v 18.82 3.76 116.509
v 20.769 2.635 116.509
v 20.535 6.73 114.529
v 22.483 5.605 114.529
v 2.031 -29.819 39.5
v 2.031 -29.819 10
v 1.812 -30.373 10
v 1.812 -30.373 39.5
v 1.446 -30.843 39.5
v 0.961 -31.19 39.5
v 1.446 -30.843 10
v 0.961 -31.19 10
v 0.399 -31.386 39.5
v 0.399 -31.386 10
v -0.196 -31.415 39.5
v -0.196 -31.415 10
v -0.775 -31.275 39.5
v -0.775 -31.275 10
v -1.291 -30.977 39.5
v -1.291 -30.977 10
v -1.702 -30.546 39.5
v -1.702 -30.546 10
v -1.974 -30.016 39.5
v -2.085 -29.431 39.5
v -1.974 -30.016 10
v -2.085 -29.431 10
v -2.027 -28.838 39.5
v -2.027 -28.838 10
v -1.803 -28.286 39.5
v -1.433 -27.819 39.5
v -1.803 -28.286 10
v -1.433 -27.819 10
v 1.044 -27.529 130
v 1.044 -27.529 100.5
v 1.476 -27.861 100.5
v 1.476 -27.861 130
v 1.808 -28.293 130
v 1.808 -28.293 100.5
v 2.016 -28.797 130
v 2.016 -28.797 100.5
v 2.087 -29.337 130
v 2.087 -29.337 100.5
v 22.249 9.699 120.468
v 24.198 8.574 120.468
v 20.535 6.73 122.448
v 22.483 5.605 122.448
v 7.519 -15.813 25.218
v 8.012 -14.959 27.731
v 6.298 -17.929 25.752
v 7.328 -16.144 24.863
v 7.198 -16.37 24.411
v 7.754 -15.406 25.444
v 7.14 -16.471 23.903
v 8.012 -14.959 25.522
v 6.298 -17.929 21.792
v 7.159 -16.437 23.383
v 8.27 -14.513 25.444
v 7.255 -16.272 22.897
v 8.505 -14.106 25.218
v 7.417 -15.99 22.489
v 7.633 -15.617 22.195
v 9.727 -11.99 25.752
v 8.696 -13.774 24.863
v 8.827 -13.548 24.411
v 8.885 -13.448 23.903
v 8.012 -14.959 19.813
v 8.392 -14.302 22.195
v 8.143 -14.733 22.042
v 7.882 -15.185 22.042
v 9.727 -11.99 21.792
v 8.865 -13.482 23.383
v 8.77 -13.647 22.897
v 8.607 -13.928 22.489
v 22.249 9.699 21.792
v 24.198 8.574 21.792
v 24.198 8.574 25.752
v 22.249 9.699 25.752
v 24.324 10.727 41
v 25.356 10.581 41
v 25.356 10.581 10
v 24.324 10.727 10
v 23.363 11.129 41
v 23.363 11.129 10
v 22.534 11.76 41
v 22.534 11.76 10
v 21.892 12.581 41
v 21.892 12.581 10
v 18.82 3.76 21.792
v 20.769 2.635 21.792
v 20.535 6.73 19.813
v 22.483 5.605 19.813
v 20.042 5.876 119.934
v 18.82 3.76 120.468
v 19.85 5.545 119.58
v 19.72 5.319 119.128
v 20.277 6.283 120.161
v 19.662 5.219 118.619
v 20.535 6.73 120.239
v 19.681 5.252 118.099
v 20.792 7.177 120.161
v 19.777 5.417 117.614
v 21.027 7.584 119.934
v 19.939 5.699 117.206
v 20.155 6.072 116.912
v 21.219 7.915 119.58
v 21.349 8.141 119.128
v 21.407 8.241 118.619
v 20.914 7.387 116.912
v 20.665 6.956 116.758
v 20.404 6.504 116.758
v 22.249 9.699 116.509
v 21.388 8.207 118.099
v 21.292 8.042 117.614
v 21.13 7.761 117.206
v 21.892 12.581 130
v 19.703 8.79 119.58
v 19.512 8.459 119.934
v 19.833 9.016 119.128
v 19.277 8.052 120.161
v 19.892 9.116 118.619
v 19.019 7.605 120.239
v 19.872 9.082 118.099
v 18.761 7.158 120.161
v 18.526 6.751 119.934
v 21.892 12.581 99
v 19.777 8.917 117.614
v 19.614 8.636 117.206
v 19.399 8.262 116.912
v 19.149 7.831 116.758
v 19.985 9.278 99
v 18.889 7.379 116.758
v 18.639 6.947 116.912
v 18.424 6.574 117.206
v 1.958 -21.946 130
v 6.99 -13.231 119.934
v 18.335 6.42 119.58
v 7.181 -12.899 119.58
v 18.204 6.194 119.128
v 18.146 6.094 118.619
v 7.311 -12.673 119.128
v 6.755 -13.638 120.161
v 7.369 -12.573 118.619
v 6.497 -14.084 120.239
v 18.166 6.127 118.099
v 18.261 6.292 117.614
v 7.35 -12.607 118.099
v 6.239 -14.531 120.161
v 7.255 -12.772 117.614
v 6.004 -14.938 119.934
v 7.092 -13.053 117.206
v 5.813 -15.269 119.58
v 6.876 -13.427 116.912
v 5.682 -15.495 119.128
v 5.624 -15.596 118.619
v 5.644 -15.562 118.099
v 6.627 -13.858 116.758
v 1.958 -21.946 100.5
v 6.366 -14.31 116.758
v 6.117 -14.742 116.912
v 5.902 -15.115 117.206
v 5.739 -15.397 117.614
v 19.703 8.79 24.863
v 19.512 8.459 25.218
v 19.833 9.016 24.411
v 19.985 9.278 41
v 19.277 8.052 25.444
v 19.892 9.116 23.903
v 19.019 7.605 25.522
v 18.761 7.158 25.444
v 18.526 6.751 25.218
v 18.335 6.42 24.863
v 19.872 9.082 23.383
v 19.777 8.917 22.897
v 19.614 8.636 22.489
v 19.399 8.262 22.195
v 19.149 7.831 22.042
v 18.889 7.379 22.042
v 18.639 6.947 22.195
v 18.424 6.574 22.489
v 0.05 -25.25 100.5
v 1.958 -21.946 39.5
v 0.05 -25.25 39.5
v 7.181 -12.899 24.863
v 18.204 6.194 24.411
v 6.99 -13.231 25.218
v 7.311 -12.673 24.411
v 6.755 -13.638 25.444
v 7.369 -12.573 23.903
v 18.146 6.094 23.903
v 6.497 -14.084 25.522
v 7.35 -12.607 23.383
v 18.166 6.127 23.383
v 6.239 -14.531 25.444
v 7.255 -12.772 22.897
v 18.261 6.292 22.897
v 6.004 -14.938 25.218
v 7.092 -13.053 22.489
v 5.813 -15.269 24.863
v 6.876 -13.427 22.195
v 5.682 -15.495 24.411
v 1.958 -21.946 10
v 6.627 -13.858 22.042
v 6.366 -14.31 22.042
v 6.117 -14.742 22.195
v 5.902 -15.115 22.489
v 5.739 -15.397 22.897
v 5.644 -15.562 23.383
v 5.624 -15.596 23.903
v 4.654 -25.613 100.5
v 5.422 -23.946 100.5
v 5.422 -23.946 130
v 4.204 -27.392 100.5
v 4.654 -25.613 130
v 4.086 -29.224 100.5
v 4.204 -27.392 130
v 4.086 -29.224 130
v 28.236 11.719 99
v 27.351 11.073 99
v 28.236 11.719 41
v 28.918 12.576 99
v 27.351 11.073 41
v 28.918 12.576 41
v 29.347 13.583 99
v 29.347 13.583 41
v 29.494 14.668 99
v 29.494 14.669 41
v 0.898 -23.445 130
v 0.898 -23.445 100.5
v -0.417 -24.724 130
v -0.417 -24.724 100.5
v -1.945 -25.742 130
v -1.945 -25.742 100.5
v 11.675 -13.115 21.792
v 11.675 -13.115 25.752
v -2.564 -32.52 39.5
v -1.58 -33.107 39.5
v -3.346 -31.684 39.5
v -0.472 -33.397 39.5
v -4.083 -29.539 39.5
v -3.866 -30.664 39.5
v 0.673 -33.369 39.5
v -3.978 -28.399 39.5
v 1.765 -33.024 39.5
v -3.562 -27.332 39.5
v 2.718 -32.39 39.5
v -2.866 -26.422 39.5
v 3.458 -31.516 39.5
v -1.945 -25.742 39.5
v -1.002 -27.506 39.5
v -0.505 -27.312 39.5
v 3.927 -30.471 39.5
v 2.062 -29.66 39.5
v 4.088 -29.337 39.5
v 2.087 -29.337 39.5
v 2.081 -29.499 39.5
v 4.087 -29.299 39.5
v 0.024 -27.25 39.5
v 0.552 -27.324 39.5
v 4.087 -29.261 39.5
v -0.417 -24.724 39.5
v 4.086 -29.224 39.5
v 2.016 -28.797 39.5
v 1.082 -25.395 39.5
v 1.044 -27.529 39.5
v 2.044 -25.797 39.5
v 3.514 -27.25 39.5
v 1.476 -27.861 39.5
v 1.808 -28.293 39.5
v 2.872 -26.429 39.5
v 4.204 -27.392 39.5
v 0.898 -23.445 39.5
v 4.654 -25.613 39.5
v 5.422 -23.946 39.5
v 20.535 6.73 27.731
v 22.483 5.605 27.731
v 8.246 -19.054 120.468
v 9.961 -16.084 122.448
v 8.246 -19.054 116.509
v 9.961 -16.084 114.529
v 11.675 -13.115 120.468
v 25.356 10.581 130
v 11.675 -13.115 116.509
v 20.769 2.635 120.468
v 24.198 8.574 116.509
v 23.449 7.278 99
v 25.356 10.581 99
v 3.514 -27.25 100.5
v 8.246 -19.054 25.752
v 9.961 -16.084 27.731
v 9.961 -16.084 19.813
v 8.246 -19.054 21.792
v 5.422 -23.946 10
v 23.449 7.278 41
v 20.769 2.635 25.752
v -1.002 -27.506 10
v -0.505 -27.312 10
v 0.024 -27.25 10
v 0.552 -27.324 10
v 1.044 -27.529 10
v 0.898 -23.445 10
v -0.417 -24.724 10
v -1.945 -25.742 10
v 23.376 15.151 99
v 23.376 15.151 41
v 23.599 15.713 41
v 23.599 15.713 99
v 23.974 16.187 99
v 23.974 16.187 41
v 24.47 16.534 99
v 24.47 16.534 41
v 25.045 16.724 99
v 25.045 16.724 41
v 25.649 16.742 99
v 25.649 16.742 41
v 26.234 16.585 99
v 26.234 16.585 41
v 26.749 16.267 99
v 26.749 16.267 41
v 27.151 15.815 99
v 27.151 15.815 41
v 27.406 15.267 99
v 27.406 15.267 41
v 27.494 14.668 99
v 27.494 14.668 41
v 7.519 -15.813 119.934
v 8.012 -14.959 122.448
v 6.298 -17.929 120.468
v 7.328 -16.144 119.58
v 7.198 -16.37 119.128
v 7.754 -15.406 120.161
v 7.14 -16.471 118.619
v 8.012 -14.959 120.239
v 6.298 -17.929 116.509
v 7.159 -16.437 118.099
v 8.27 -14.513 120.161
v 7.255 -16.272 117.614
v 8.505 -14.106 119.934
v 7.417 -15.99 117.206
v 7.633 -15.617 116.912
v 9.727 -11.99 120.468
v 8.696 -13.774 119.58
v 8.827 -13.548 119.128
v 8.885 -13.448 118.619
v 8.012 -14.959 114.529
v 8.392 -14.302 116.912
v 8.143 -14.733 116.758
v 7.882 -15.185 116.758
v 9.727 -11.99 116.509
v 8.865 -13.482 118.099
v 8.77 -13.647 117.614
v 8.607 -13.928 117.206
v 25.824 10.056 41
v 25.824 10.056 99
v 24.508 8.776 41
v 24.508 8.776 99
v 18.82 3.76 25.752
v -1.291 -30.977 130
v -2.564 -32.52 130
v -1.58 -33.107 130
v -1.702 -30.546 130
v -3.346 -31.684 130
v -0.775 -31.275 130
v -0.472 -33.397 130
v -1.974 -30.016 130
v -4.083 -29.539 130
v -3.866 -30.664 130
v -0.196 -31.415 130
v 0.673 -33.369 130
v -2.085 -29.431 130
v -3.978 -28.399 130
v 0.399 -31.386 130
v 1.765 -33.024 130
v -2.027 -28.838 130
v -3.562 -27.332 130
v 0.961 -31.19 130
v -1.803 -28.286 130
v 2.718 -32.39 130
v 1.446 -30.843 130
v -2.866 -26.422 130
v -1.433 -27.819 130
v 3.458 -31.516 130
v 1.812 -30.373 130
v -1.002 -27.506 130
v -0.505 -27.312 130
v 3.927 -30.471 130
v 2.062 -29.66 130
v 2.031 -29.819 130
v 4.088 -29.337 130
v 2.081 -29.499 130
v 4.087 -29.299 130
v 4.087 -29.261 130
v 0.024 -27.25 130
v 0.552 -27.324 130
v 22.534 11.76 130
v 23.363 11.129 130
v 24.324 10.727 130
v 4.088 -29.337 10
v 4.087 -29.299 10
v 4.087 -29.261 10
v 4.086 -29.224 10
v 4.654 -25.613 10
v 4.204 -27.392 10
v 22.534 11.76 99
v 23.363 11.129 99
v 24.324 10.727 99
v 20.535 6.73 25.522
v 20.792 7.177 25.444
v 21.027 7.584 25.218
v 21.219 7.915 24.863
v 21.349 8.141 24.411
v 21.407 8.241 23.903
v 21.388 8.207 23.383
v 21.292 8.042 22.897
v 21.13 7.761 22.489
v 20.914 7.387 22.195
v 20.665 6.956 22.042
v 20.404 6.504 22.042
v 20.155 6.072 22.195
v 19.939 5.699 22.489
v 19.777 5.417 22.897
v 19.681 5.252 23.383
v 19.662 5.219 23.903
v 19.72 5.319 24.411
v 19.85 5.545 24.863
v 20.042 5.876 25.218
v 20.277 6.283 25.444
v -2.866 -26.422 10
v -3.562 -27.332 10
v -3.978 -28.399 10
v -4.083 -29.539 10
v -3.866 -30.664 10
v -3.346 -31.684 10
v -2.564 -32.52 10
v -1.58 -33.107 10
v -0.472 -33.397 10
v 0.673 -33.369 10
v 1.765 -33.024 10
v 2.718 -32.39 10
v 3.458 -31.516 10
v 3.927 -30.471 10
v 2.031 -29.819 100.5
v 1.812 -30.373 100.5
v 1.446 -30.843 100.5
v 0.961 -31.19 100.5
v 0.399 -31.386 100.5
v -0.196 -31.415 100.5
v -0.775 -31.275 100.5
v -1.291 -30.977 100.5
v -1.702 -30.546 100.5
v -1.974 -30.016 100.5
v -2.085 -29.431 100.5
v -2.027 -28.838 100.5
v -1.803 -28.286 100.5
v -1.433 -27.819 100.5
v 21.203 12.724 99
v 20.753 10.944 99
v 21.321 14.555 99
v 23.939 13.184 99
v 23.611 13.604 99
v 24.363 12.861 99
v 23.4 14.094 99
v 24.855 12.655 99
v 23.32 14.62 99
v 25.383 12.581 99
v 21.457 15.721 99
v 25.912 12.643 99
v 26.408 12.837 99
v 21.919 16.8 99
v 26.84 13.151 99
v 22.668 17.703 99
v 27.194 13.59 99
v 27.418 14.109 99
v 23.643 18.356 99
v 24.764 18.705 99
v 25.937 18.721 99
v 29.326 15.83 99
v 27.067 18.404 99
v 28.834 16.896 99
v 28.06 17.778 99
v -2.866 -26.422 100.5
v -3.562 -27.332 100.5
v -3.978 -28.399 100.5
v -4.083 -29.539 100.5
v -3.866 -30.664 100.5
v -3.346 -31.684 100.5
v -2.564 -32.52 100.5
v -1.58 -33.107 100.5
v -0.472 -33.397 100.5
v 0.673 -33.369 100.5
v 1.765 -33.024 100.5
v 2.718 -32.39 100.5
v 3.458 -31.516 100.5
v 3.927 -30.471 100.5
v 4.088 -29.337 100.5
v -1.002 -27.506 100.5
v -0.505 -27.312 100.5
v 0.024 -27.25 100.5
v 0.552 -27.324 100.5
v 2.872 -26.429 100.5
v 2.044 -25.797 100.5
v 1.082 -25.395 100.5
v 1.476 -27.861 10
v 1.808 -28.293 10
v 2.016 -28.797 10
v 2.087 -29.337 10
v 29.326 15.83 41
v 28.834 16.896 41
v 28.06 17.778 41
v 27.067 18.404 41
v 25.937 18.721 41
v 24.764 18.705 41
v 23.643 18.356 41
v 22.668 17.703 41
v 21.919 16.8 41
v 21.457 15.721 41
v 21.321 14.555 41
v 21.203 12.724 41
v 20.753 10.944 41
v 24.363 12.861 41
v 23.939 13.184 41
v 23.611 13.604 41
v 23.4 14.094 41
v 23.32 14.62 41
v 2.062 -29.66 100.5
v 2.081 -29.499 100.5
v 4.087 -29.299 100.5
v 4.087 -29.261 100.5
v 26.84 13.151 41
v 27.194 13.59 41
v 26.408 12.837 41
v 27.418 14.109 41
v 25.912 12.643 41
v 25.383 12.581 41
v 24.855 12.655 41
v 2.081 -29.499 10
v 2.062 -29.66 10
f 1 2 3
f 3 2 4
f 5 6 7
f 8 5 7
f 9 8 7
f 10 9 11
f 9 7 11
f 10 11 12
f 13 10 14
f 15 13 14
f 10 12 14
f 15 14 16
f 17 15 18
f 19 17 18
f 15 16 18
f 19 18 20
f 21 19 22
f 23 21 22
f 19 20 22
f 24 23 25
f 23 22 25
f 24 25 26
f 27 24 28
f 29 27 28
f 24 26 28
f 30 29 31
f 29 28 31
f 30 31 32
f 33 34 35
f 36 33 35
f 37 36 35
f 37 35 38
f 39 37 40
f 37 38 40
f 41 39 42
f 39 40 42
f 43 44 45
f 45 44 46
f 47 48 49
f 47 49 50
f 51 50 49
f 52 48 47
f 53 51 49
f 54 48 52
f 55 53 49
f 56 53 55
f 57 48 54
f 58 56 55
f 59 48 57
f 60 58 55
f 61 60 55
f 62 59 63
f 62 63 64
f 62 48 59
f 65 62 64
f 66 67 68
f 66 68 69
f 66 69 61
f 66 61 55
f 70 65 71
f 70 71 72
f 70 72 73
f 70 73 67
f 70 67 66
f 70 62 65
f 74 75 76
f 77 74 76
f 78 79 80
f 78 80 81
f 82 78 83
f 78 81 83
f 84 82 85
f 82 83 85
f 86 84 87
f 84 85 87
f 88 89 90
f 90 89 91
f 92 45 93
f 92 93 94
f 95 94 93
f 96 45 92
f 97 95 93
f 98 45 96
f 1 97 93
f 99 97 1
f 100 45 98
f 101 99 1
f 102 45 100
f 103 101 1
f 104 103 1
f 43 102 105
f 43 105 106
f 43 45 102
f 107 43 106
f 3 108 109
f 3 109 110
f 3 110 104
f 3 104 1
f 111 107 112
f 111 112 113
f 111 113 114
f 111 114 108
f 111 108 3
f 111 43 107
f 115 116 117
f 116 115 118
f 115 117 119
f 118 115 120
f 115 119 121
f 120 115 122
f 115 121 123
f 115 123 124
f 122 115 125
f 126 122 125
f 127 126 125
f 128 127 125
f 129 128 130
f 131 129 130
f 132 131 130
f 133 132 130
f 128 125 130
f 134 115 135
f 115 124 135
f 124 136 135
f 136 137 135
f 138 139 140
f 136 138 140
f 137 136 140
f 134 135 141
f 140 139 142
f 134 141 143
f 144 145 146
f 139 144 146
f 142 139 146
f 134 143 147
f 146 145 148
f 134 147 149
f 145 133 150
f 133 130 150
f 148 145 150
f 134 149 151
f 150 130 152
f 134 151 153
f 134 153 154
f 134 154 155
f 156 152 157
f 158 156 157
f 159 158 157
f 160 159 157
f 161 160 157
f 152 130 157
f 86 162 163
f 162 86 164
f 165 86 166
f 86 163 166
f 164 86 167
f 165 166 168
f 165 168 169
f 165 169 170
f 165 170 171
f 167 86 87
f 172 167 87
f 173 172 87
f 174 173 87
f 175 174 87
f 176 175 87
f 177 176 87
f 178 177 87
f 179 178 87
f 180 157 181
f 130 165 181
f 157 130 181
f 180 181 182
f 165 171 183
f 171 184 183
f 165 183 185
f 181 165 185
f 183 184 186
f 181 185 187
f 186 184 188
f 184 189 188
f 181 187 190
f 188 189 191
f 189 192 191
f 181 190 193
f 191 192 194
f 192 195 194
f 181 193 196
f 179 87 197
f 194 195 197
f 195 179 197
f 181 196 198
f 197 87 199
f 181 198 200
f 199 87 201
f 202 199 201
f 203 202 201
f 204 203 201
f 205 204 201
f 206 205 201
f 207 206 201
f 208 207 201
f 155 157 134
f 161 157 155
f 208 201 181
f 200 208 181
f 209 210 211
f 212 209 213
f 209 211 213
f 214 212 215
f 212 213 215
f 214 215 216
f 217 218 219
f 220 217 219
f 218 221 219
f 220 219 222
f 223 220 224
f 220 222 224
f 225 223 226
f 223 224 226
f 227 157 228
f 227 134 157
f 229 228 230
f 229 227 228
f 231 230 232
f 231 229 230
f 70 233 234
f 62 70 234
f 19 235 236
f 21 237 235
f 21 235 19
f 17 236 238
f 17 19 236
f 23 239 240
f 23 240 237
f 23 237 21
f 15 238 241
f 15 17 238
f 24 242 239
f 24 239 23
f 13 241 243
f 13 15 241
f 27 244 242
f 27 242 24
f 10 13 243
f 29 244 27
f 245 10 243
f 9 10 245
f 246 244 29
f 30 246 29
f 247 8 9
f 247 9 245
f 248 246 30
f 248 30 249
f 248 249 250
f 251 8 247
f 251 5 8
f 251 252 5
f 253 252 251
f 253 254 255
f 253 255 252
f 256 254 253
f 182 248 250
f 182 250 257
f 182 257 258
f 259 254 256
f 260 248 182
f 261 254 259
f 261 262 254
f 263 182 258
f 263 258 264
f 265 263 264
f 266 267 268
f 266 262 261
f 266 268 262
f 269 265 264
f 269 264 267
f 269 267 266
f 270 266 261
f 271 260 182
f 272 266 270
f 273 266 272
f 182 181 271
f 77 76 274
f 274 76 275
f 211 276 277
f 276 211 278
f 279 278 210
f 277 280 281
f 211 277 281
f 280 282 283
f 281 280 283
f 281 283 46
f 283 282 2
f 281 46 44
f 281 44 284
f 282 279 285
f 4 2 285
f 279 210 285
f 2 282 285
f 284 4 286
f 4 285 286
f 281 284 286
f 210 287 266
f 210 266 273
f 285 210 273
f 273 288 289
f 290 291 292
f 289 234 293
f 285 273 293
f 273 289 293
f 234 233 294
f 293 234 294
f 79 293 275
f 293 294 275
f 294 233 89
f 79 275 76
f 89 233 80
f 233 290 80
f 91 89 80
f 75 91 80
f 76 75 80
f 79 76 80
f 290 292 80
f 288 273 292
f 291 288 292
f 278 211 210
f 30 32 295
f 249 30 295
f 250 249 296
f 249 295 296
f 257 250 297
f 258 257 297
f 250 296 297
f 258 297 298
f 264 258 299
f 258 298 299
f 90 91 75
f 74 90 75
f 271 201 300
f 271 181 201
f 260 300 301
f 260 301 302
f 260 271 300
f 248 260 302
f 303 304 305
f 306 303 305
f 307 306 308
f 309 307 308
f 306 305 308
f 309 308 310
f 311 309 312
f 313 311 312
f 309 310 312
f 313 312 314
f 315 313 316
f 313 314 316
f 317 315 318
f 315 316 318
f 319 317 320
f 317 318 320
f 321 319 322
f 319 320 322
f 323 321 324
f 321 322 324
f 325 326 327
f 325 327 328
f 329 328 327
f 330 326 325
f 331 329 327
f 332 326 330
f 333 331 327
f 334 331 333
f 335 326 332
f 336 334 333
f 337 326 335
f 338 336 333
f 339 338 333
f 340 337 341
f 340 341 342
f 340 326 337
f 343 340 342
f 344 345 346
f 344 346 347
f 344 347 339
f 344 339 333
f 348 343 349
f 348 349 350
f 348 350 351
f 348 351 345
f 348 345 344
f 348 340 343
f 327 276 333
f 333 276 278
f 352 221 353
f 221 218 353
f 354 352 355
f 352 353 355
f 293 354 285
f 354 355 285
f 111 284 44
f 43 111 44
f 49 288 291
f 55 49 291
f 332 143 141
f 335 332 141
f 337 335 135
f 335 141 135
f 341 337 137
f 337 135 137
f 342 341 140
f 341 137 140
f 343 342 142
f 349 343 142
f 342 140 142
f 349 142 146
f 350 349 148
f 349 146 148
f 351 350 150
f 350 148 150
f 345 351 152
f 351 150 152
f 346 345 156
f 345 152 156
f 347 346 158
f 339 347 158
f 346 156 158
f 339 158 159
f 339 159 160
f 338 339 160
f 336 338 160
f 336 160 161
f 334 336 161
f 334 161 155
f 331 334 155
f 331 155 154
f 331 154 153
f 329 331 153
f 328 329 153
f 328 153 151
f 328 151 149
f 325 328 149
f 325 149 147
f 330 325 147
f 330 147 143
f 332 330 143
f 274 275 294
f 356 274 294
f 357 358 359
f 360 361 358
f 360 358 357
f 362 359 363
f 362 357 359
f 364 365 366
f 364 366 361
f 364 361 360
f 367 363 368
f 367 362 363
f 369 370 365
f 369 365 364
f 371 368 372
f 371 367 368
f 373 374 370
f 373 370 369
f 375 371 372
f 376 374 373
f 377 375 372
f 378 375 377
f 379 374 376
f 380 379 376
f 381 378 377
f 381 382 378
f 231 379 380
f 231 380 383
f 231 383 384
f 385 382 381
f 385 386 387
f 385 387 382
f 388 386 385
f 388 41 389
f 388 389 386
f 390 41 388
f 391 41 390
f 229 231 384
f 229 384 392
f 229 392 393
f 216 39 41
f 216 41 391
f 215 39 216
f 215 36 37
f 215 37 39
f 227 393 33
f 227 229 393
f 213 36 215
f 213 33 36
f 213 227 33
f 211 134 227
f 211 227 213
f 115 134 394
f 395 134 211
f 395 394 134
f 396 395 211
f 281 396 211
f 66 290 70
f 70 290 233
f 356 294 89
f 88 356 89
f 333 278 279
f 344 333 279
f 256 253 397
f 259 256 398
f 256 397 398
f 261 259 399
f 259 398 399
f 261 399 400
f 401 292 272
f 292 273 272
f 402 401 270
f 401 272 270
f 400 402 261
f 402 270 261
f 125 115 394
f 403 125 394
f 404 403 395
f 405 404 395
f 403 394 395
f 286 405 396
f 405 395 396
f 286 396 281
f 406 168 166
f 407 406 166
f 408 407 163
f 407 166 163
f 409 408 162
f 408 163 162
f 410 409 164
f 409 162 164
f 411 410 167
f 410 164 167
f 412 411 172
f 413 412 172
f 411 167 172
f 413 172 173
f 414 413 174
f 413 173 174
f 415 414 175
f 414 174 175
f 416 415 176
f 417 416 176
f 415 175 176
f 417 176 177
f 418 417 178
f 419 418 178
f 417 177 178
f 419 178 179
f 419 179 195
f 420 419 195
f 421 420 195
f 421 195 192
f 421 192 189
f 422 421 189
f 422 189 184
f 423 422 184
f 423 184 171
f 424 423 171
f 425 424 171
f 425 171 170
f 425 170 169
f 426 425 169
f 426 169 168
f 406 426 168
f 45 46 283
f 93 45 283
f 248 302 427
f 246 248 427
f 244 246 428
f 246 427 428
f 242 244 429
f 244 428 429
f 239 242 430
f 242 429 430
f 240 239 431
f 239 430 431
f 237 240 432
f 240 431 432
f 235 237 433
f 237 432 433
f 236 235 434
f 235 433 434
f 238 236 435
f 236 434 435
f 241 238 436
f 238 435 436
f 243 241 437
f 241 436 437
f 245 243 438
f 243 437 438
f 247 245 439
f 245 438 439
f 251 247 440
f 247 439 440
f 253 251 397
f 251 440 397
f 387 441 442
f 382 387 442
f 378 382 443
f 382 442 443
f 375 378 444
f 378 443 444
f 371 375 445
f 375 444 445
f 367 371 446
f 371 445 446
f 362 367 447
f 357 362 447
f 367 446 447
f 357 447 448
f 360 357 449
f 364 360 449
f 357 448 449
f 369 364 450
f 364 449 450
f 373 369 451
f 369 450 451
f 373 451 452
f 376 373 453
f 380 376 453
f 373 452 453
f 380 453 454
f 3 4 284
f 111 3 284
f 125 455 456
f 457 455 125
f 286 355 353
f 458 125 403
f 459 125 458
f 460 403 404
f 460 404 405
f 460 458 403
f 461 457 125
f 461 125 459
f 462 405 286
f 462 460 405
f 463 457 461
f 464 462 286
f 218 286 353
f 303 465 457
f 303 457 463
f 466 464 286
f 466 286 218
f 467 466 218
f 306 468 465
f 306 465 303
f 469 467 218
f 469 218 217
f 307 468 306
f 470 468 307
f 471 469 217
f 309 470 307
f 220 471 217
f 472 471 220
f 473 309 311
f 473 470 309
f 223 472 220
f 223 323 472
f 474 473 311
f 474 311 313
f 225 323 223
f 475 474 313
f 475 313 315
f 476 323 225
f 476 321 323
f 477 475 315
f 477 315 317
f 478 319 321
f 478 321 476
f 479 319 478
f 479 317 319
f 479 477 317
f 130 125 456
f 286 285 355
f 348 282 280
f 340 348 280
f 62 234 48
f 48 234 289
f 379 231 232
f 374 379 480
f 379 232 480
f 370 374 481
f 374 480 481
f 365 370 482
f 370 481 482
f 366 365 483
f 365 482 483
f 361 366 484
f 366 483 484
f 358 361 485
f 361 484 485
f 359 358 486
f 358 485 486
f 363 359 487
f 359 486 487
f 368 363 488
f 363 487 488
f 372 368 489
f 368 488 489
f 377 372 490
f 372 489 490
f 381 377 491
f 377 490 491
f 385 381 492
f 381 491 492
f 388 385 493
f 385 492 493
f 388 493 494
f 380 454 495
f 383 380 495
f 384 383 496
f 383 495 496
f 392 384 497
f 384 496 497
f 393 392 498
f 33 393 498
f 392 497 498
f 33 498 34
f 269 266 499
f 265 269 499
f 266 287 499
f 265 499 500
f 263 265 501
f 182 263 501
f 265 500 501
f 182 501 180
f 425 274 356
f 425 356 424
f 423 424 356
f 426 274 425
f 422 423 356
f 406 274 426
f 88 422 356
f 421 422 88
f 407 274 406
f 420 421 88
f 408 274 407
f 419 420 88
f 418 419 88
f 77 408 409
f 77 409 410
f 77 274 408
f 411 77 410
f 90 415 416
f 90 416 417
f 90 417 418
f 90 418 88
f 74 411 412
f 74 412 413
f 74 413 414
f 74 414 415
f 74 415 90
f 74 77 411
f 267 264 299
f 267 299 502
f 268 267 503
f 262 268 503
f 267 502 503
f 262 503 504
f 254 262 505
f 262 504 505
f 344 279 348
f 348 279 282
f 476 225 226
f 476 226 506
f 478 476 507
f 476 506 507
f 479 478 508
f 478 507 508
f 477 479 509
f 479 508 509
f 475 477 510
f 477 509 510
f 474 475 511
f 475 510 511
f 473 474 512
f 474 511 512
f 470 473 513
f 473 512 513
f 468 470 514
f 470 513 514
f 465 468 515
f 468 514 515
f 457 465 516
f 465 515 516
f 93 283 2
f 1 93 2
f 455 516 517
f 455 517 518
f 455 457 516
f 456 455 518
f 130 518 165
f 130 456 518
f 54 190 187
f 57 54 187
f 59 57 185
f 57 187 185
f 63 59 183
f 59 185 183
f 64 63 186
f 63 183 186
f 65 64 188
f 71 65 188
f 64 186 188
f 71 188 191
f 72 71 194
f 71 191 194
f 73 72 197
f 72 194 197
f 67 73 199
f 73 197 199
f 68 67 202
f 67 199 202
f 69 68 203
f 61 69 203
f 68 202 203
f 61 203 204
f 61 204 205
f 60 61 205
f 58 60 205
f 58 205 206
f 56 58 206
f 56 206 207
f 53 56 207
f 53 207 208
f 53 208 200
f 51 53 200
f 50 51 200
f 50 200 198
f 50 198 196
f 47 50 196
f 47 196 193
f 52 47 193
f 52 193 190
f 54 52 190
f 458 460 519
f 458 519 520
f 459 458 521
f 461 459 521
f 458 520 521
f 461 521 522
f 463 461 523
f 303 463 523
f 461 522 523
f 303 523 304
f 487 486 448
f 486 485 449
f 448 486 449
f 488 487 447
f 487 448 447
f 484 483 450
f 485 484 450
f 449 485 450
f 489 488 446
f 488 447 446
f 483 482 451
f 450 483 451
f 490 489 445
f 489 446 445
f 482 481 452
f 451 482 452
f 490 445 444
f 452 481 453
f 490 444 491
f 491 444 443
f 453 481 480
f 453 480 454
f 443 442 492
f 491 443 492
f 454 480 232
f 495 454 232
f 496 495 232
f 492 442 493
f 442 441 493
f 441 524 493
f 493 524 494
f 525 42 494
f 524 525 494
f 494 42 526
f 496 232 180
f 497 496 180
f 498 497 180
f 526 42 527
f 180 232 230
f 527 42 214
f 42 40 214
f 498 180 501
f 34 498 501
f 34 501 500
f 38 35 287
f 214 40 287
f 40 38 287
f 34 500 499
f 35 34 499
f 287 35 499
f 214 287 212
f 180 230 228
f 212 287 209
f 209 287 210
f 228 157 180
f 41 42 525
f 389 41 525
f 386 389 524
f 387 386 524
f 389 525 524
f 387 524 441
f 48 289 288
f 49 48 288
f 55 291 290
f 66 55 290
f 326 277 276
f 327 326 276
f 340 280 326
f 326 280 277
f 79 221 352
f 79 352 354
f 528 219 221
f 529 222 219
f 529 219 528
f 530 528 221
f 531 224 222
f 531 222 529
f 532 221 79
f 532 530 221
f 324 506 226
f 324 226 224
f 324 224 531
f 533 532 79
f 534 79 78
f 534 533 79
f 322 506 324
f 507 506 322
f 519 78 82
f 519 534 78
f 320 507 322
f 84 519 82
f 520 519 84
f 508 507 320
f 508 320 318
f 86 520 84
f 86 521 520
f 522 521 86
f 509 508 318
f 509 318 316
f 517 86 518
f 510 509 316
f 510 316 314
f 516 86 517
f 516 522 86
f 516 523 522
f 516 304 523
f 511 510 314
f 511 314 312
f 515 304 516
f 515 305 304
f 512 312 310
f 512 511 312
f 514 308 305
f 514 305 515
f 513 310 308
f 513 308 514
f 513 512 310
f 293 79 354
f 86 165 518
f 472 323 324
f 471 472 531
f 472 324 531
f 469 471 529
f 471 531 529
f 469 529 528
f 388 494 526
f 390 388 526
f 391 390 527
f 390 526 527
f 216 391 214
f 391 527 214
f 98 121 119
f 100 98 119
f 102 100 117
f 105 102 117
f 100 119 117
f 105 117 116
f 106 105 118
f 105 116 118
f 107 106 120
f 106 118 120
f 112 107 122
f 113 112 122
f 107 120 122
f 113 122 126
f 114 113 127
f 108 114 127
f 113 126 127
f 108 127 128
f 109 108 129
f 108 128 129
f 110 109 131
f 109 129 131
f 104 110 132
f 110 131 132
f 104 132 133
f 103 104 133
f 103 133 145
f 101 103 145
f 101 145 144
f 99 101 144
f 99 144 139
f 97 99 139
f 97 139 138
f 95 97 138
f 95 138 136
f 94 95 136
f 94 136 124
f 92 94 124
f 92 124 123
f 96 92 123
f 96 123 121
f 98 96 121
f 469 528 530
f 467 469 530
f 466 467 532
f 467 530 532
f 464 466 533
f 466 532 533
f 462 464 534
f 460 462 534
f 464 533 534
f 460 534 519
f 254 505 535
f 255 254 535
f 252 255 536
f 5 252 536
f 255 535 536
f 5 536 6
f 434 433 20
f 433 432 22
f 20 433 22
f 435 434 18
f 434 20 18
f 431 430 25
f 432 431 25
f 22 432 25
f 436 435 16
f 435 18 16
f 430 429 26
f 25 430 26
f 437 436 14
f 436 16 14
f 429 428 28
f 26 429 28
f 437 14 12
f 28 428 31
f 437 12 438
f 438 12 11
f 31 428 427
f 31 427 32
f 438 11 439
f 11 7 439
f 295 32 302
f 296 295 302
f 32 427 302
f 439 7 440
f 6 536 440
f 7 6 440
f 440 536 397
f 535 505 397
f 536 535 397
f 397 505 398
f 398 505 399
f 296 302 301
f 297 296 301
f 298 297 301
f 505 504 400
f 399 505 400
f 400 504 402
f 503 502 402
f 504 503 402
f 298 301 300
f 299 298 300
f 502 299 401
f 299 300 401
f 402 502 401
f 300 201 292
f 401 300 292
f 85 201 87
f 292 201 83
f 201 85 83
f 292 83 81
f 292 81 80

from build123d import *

# Parameters (mm, degrees)
SKETCH2_R               = 1.5875
BOSS_EXTRUDE1_DEPTH     = 10
BOSS_EXTRUDE2_DEPTH     = 120
SKETCH4_R               = 4.0875
CUT_EXTRUDE1_DEPTH      = 30.5
CUT_EXTRUDE1_DEPTH_BACK = 30.5
SKETCH5_R               = 4.0875
CUT_EXTRUDE2_DEPTH      = 31
SKETCH6_R               = 4.0875
CUT_EXTRUDE3_DEPTH      = 31
FILLET1_R               = 10
SKETCH7_R               = 1.75
CUT_EXTRUDE4_DEPTH      = 4
CUT_EXTRUDE5_DEPTH      = 2.25


with BuildPart() as part:
    # Sketch2 → Boss-Extrude1 (new body)
    with BuildSketch(Plane.XY):
        with BuildLine():
            Line((0, -27.7495), (0, 0))
            Line((0, 0), (38.1, 0))
            ThreePointArc((38.1, 0), (-26.940768363, 26.940768363), (0, -38.1))
            Line((0, -38.1), (0, -30.9245))
            ThreePointArc((0, -30.9245), (-1.5875, -29.337), (0, -27.7495))
        make_face()
        with Locations((-25.406587271, 14.6685)):
            Circle(SKETCH2_R, mode=Mode.SUBTRACT)
        with Locations((25.406587271, 14.6685)):
            Circle(SKETCH2_R, mode=Mode.SUBTRACT)
        with BuildLine():
            Line((38.1, 0), (0, 0))
            Line((0, 0), (0, -27.7495))
            ThreePointArc((0, -27.7495), (1.122532015, -28.214467985), (1.5875, -29.337))
            ThreePointArc((1.5875, -29.337), (1.122532015, -30.459532015), (0, -30.9245))
            Line((0, -30.9245), (0, -38.1))
            ThreePointArc((0, -38.1), (26.940768363, -26.940768363), (38.1, 0))
        make_face()
    extrude(amount=BOSS_EXTRUDE1_DEPTH)


with BuildPart() as body_2:
    # Sketch3 → Boss-Extrude2 (new body)
    with BuildSketch(Plane.XY.offset(10)):
        with BuildLine():
            ThreePointArc((29.494087271, 14.6685), (24.324372064, 18.610132466), (21.892146477, 12.581309985))
            Line((21.892146477, 12.581309985), (23.37551462, 15.150578976))
            ThreePointArc((23.37551462, 15.150578976), (25.649272347, 16.741845172), (27.494087271, 14.6685))
            ThreePointArc((27.494087271, 14.6685), (27.323499399, 13.841998855), (26.839616236, 13.150578976))
            Line((26.839616236, 13.150578976), (25.356248092, 10.581309985))
            ThreePointArc((25.356248092, 10.581309985), (28.279033516, 11.760457906), (29.494087271, 14.6685))
        make_face()
        with BuildLine():
            Line((24.362837271, 12.86067197), (23.362837271, 11.128621162))
            ThreePointArc((23.362837271, 11.128621162), (24.324372064, 10.726867534), (25.356248092, 10.581309985))
            Line((25.356248092, 10.581309985), (26.839616236, 13.150578976))
            ThreePointArc((26.839616236, 13.150578976), (25.649272347, 12.595154828), (24.362837271, 12.86067197))
        make_face()
        with BuildLine():
            ThreePointArc((21.892146477, 12.581309985), (22.534141026, 11.760457906), (23.362837271, 11.128621162))
            Line((23.362837271, 11.128621162), (24.362837271, 12.86067197))
            ThreePointArc((24.362837271, 12.86067197), (23.489675143, 13.841998855), (23.37551462, 15.150578976))
            Line((23.37551462, 15.150578976), (21.892146477, 12.581309985))
        make_face()
        with BuildLine():
            Line((23.362837271, 11.128621162), (2.04375, -25.797121162))
            ThreePointArc((2.04375, -25.797121162), (2.872446245, -26.428957906), (3.514440794, -27.249809985))
            Line((3.514440794, -27.249809985), (25.356248092, 10.581309985))
            ThreePointArc((25.356248092, 10.581309985), (24.324372064, 10.726867534), (23.362837271, 11.128621162))
        make_face()
        with BuildLine():
            ThreePointArc((0.050339179, -25.249809985), (1.082215206, -25.395367534), (2.04375, -25.797121162))
            Line((2.04375, -25.797121162), (23.362837271, 11.128621162))
            ThreePointArc((23.362837271, 11.128621162), (22.534141026, 11.760457906), (21.892146477, 12.581309985))
            Line((21.892146477, 12.581309985), (0.050339179, -25.249809985))
        make_face()
        with BuildLine():
            ThreePointArc((-1.433028965, -27.819078976), (-0.242685076, -27.263654828), (1.04375, -27.52917197))
            Line((1.04375, -27.52917197), (2.04375, -25.797121162))
            ThreePointArc((2.04375, -25.797121162), (1.082215206, -25.395367534), (0.050339179, -25.249809985))
            Line((0.050339179, -25.249809985), (-1.433028965, -27.819078976))
        make_face()
        with BuildLine():
            Line((2.04375, -25.797121162), (1.04375, -27.52917197))
            ThreePointArc((1.04375, -27.52917197), (1.80782803, -28.29325), (2.0875, -29.337))
            ThreePointArc((2.0875, -29.337), (2.073345172, -29.579685076), (2.03107265, -29.819078976))
            Line((2.03107265, -29.819078976), (3.514440794, -27.249809985))
            ThreePointArc((3.514440794, -27.249809985), (2.872446245, -26.428957906), (2.04375, -25.797121162))
        make_face()
        with BuildLine():
            ThreePointArc((2.03107265, -29.819078976), (-1.04375, -31.14482803), (-1.433028965, -27.819078976))
            Line((-1.433028965, -27.819078976), (0.050339179, -25.249809985))
            ThreePointArc((0.050339179, -25.249809985), (-2.908042094, -32.209446245), (4.0875, -29.337))
            ThreePointArc((4.0875, -29.337), (3.941632466, -28.254784794), (3.514440794, -27.249809985))
            Line((3.514440794, -27.249809985), (2.03107265, -29.819078976))
        make_face()
    extrude(amount=BOSS_EXTRUDE2_DEPTH)

    # Sketch4 → Cut-Extrude1 (cut, two sides)
    with BuildSketch(Plane.XY.offset(70)) as cut_extrude1_sk:
        with Locations((0, -29.337)):
            Circle(SKETCH4_R)
    extrude(amount=CUT_EXTRUDE1_DEPTH, mode=Mode.SUBTRACT)
    extrude(cut_extrude1_sk.sketch, amount=-CUT_EXTRUDE1_DEPTH_BACK, mode=Mode.SUBTRACT)

    # Sketch5 → Cut-Extrude2 (cut)
    with BuildSketch(Plane(origin=(0, 0, 10), x_dir=(-1, 0, 0), z_dir=(0, 0, -1))):
        with Locations((-25.406587271, 14.6685)):
            Circle(SKETCH5_R)
    extrude(amount=-CUT_EXTRUDE2_DEPTH, mode=Mode.SUBTRACT)

    # Sketch6 → Cut-Extrude3 (cut)
    with BuildSketch(Plane.XY.offset(130)):
        with Locations((25.406587271, 14.6685)):
            Circle(SKETCH6_R)
    extrude(amount=-CUT_EXTRUDE3_DEPTH, mode=Mode.SUBTRACT)

    # Fillet1
    fillet1_edges = [body_2.edges().sort_by_distance(p)[0] for p in [
        (0.050339179, -25.249809985, 115.25),
        (3.514440794, -27.249809985, 115.25),
        (0.050339179, -25.249809985, 24.75),
        (3.514440794, -27.249809985, 24.75),
        (21.892146477, 12.581309985, 70),
        (25.356248092, 10.581309985, 70),
    ]]
    fillet(fillet1_edges, radius=FILLET1_R)

    # Sketch7 → Cut-Extrude4 (cut)
    with BuildSketch(Plane(origin=(10.971242828, -6.33425, 0), x_dir=(0, 0, 1), z_dir=(-0.866025404, 0.5, 0))):
        with Locations((23.771980031, -8.948916416)):
            Circle(SKETCH7_R)
        with Locations((23.771980031, 16.095483584)):
            Circle(SKETCH7_R)
        with Locations((118.488580031, 16.095483584)):
            Circle(SKETCH7_R)
        with Locations((118.488580031, -8.948916416)):
            Circle(SKETCH7_R)
    extrude(amount=-CUT_EXTRUDE4_DEPTH, mode=Mode.SUBTRACT)

    # Sketch8 → Cut-Extrude5 (cut)
    with BuildSketch(Plane(origin=(14.435344443, -8.33425, 0), x_dir=(0, 0, -1), z_dir=(0.866025404, -0.5, 0))):
        Polygon((-19.812511885, 16.095483584), (-21.792245958, 19.524483584), (-25.751714104, 19.524483584), (-27.731448177, 16.095483584), (-25.751714104, 12.666483584), (-21.792245958, 12.666483584), align=None)
        Polygon((-19.812511885, -8.948916416), (-21.792245958, -5.519916416), (-25.751714104, -5.519916416), (-27.731448177, -8.948916416), (-25.751714104, -12.377916416), (-21.792245958, -12.377916416), align=None)
        Polygon((-114.529111885, 16.095483584), (-116.508845958, 19.524483584), (-120.468314104, 19.524483584), (-122.448048177, 16.095483584), (-120.468314104, 12.666483584), (-116.508845958, 12.666483584), align=None)
        Polygon((-114.529111885, -8.948916416), (-116.508845958, -5.519916416), (-120.468314104, -5.519916416), (-122.448048177, -8.948916416), (-120.468314104, -12.377916416), (-116.508845958, -12.377916416), align=None)
    extrude(amount=-CUT_EXTRUDE5_DEPTH, mode=Mode.SUBTRACT)


solid = body_2.part
